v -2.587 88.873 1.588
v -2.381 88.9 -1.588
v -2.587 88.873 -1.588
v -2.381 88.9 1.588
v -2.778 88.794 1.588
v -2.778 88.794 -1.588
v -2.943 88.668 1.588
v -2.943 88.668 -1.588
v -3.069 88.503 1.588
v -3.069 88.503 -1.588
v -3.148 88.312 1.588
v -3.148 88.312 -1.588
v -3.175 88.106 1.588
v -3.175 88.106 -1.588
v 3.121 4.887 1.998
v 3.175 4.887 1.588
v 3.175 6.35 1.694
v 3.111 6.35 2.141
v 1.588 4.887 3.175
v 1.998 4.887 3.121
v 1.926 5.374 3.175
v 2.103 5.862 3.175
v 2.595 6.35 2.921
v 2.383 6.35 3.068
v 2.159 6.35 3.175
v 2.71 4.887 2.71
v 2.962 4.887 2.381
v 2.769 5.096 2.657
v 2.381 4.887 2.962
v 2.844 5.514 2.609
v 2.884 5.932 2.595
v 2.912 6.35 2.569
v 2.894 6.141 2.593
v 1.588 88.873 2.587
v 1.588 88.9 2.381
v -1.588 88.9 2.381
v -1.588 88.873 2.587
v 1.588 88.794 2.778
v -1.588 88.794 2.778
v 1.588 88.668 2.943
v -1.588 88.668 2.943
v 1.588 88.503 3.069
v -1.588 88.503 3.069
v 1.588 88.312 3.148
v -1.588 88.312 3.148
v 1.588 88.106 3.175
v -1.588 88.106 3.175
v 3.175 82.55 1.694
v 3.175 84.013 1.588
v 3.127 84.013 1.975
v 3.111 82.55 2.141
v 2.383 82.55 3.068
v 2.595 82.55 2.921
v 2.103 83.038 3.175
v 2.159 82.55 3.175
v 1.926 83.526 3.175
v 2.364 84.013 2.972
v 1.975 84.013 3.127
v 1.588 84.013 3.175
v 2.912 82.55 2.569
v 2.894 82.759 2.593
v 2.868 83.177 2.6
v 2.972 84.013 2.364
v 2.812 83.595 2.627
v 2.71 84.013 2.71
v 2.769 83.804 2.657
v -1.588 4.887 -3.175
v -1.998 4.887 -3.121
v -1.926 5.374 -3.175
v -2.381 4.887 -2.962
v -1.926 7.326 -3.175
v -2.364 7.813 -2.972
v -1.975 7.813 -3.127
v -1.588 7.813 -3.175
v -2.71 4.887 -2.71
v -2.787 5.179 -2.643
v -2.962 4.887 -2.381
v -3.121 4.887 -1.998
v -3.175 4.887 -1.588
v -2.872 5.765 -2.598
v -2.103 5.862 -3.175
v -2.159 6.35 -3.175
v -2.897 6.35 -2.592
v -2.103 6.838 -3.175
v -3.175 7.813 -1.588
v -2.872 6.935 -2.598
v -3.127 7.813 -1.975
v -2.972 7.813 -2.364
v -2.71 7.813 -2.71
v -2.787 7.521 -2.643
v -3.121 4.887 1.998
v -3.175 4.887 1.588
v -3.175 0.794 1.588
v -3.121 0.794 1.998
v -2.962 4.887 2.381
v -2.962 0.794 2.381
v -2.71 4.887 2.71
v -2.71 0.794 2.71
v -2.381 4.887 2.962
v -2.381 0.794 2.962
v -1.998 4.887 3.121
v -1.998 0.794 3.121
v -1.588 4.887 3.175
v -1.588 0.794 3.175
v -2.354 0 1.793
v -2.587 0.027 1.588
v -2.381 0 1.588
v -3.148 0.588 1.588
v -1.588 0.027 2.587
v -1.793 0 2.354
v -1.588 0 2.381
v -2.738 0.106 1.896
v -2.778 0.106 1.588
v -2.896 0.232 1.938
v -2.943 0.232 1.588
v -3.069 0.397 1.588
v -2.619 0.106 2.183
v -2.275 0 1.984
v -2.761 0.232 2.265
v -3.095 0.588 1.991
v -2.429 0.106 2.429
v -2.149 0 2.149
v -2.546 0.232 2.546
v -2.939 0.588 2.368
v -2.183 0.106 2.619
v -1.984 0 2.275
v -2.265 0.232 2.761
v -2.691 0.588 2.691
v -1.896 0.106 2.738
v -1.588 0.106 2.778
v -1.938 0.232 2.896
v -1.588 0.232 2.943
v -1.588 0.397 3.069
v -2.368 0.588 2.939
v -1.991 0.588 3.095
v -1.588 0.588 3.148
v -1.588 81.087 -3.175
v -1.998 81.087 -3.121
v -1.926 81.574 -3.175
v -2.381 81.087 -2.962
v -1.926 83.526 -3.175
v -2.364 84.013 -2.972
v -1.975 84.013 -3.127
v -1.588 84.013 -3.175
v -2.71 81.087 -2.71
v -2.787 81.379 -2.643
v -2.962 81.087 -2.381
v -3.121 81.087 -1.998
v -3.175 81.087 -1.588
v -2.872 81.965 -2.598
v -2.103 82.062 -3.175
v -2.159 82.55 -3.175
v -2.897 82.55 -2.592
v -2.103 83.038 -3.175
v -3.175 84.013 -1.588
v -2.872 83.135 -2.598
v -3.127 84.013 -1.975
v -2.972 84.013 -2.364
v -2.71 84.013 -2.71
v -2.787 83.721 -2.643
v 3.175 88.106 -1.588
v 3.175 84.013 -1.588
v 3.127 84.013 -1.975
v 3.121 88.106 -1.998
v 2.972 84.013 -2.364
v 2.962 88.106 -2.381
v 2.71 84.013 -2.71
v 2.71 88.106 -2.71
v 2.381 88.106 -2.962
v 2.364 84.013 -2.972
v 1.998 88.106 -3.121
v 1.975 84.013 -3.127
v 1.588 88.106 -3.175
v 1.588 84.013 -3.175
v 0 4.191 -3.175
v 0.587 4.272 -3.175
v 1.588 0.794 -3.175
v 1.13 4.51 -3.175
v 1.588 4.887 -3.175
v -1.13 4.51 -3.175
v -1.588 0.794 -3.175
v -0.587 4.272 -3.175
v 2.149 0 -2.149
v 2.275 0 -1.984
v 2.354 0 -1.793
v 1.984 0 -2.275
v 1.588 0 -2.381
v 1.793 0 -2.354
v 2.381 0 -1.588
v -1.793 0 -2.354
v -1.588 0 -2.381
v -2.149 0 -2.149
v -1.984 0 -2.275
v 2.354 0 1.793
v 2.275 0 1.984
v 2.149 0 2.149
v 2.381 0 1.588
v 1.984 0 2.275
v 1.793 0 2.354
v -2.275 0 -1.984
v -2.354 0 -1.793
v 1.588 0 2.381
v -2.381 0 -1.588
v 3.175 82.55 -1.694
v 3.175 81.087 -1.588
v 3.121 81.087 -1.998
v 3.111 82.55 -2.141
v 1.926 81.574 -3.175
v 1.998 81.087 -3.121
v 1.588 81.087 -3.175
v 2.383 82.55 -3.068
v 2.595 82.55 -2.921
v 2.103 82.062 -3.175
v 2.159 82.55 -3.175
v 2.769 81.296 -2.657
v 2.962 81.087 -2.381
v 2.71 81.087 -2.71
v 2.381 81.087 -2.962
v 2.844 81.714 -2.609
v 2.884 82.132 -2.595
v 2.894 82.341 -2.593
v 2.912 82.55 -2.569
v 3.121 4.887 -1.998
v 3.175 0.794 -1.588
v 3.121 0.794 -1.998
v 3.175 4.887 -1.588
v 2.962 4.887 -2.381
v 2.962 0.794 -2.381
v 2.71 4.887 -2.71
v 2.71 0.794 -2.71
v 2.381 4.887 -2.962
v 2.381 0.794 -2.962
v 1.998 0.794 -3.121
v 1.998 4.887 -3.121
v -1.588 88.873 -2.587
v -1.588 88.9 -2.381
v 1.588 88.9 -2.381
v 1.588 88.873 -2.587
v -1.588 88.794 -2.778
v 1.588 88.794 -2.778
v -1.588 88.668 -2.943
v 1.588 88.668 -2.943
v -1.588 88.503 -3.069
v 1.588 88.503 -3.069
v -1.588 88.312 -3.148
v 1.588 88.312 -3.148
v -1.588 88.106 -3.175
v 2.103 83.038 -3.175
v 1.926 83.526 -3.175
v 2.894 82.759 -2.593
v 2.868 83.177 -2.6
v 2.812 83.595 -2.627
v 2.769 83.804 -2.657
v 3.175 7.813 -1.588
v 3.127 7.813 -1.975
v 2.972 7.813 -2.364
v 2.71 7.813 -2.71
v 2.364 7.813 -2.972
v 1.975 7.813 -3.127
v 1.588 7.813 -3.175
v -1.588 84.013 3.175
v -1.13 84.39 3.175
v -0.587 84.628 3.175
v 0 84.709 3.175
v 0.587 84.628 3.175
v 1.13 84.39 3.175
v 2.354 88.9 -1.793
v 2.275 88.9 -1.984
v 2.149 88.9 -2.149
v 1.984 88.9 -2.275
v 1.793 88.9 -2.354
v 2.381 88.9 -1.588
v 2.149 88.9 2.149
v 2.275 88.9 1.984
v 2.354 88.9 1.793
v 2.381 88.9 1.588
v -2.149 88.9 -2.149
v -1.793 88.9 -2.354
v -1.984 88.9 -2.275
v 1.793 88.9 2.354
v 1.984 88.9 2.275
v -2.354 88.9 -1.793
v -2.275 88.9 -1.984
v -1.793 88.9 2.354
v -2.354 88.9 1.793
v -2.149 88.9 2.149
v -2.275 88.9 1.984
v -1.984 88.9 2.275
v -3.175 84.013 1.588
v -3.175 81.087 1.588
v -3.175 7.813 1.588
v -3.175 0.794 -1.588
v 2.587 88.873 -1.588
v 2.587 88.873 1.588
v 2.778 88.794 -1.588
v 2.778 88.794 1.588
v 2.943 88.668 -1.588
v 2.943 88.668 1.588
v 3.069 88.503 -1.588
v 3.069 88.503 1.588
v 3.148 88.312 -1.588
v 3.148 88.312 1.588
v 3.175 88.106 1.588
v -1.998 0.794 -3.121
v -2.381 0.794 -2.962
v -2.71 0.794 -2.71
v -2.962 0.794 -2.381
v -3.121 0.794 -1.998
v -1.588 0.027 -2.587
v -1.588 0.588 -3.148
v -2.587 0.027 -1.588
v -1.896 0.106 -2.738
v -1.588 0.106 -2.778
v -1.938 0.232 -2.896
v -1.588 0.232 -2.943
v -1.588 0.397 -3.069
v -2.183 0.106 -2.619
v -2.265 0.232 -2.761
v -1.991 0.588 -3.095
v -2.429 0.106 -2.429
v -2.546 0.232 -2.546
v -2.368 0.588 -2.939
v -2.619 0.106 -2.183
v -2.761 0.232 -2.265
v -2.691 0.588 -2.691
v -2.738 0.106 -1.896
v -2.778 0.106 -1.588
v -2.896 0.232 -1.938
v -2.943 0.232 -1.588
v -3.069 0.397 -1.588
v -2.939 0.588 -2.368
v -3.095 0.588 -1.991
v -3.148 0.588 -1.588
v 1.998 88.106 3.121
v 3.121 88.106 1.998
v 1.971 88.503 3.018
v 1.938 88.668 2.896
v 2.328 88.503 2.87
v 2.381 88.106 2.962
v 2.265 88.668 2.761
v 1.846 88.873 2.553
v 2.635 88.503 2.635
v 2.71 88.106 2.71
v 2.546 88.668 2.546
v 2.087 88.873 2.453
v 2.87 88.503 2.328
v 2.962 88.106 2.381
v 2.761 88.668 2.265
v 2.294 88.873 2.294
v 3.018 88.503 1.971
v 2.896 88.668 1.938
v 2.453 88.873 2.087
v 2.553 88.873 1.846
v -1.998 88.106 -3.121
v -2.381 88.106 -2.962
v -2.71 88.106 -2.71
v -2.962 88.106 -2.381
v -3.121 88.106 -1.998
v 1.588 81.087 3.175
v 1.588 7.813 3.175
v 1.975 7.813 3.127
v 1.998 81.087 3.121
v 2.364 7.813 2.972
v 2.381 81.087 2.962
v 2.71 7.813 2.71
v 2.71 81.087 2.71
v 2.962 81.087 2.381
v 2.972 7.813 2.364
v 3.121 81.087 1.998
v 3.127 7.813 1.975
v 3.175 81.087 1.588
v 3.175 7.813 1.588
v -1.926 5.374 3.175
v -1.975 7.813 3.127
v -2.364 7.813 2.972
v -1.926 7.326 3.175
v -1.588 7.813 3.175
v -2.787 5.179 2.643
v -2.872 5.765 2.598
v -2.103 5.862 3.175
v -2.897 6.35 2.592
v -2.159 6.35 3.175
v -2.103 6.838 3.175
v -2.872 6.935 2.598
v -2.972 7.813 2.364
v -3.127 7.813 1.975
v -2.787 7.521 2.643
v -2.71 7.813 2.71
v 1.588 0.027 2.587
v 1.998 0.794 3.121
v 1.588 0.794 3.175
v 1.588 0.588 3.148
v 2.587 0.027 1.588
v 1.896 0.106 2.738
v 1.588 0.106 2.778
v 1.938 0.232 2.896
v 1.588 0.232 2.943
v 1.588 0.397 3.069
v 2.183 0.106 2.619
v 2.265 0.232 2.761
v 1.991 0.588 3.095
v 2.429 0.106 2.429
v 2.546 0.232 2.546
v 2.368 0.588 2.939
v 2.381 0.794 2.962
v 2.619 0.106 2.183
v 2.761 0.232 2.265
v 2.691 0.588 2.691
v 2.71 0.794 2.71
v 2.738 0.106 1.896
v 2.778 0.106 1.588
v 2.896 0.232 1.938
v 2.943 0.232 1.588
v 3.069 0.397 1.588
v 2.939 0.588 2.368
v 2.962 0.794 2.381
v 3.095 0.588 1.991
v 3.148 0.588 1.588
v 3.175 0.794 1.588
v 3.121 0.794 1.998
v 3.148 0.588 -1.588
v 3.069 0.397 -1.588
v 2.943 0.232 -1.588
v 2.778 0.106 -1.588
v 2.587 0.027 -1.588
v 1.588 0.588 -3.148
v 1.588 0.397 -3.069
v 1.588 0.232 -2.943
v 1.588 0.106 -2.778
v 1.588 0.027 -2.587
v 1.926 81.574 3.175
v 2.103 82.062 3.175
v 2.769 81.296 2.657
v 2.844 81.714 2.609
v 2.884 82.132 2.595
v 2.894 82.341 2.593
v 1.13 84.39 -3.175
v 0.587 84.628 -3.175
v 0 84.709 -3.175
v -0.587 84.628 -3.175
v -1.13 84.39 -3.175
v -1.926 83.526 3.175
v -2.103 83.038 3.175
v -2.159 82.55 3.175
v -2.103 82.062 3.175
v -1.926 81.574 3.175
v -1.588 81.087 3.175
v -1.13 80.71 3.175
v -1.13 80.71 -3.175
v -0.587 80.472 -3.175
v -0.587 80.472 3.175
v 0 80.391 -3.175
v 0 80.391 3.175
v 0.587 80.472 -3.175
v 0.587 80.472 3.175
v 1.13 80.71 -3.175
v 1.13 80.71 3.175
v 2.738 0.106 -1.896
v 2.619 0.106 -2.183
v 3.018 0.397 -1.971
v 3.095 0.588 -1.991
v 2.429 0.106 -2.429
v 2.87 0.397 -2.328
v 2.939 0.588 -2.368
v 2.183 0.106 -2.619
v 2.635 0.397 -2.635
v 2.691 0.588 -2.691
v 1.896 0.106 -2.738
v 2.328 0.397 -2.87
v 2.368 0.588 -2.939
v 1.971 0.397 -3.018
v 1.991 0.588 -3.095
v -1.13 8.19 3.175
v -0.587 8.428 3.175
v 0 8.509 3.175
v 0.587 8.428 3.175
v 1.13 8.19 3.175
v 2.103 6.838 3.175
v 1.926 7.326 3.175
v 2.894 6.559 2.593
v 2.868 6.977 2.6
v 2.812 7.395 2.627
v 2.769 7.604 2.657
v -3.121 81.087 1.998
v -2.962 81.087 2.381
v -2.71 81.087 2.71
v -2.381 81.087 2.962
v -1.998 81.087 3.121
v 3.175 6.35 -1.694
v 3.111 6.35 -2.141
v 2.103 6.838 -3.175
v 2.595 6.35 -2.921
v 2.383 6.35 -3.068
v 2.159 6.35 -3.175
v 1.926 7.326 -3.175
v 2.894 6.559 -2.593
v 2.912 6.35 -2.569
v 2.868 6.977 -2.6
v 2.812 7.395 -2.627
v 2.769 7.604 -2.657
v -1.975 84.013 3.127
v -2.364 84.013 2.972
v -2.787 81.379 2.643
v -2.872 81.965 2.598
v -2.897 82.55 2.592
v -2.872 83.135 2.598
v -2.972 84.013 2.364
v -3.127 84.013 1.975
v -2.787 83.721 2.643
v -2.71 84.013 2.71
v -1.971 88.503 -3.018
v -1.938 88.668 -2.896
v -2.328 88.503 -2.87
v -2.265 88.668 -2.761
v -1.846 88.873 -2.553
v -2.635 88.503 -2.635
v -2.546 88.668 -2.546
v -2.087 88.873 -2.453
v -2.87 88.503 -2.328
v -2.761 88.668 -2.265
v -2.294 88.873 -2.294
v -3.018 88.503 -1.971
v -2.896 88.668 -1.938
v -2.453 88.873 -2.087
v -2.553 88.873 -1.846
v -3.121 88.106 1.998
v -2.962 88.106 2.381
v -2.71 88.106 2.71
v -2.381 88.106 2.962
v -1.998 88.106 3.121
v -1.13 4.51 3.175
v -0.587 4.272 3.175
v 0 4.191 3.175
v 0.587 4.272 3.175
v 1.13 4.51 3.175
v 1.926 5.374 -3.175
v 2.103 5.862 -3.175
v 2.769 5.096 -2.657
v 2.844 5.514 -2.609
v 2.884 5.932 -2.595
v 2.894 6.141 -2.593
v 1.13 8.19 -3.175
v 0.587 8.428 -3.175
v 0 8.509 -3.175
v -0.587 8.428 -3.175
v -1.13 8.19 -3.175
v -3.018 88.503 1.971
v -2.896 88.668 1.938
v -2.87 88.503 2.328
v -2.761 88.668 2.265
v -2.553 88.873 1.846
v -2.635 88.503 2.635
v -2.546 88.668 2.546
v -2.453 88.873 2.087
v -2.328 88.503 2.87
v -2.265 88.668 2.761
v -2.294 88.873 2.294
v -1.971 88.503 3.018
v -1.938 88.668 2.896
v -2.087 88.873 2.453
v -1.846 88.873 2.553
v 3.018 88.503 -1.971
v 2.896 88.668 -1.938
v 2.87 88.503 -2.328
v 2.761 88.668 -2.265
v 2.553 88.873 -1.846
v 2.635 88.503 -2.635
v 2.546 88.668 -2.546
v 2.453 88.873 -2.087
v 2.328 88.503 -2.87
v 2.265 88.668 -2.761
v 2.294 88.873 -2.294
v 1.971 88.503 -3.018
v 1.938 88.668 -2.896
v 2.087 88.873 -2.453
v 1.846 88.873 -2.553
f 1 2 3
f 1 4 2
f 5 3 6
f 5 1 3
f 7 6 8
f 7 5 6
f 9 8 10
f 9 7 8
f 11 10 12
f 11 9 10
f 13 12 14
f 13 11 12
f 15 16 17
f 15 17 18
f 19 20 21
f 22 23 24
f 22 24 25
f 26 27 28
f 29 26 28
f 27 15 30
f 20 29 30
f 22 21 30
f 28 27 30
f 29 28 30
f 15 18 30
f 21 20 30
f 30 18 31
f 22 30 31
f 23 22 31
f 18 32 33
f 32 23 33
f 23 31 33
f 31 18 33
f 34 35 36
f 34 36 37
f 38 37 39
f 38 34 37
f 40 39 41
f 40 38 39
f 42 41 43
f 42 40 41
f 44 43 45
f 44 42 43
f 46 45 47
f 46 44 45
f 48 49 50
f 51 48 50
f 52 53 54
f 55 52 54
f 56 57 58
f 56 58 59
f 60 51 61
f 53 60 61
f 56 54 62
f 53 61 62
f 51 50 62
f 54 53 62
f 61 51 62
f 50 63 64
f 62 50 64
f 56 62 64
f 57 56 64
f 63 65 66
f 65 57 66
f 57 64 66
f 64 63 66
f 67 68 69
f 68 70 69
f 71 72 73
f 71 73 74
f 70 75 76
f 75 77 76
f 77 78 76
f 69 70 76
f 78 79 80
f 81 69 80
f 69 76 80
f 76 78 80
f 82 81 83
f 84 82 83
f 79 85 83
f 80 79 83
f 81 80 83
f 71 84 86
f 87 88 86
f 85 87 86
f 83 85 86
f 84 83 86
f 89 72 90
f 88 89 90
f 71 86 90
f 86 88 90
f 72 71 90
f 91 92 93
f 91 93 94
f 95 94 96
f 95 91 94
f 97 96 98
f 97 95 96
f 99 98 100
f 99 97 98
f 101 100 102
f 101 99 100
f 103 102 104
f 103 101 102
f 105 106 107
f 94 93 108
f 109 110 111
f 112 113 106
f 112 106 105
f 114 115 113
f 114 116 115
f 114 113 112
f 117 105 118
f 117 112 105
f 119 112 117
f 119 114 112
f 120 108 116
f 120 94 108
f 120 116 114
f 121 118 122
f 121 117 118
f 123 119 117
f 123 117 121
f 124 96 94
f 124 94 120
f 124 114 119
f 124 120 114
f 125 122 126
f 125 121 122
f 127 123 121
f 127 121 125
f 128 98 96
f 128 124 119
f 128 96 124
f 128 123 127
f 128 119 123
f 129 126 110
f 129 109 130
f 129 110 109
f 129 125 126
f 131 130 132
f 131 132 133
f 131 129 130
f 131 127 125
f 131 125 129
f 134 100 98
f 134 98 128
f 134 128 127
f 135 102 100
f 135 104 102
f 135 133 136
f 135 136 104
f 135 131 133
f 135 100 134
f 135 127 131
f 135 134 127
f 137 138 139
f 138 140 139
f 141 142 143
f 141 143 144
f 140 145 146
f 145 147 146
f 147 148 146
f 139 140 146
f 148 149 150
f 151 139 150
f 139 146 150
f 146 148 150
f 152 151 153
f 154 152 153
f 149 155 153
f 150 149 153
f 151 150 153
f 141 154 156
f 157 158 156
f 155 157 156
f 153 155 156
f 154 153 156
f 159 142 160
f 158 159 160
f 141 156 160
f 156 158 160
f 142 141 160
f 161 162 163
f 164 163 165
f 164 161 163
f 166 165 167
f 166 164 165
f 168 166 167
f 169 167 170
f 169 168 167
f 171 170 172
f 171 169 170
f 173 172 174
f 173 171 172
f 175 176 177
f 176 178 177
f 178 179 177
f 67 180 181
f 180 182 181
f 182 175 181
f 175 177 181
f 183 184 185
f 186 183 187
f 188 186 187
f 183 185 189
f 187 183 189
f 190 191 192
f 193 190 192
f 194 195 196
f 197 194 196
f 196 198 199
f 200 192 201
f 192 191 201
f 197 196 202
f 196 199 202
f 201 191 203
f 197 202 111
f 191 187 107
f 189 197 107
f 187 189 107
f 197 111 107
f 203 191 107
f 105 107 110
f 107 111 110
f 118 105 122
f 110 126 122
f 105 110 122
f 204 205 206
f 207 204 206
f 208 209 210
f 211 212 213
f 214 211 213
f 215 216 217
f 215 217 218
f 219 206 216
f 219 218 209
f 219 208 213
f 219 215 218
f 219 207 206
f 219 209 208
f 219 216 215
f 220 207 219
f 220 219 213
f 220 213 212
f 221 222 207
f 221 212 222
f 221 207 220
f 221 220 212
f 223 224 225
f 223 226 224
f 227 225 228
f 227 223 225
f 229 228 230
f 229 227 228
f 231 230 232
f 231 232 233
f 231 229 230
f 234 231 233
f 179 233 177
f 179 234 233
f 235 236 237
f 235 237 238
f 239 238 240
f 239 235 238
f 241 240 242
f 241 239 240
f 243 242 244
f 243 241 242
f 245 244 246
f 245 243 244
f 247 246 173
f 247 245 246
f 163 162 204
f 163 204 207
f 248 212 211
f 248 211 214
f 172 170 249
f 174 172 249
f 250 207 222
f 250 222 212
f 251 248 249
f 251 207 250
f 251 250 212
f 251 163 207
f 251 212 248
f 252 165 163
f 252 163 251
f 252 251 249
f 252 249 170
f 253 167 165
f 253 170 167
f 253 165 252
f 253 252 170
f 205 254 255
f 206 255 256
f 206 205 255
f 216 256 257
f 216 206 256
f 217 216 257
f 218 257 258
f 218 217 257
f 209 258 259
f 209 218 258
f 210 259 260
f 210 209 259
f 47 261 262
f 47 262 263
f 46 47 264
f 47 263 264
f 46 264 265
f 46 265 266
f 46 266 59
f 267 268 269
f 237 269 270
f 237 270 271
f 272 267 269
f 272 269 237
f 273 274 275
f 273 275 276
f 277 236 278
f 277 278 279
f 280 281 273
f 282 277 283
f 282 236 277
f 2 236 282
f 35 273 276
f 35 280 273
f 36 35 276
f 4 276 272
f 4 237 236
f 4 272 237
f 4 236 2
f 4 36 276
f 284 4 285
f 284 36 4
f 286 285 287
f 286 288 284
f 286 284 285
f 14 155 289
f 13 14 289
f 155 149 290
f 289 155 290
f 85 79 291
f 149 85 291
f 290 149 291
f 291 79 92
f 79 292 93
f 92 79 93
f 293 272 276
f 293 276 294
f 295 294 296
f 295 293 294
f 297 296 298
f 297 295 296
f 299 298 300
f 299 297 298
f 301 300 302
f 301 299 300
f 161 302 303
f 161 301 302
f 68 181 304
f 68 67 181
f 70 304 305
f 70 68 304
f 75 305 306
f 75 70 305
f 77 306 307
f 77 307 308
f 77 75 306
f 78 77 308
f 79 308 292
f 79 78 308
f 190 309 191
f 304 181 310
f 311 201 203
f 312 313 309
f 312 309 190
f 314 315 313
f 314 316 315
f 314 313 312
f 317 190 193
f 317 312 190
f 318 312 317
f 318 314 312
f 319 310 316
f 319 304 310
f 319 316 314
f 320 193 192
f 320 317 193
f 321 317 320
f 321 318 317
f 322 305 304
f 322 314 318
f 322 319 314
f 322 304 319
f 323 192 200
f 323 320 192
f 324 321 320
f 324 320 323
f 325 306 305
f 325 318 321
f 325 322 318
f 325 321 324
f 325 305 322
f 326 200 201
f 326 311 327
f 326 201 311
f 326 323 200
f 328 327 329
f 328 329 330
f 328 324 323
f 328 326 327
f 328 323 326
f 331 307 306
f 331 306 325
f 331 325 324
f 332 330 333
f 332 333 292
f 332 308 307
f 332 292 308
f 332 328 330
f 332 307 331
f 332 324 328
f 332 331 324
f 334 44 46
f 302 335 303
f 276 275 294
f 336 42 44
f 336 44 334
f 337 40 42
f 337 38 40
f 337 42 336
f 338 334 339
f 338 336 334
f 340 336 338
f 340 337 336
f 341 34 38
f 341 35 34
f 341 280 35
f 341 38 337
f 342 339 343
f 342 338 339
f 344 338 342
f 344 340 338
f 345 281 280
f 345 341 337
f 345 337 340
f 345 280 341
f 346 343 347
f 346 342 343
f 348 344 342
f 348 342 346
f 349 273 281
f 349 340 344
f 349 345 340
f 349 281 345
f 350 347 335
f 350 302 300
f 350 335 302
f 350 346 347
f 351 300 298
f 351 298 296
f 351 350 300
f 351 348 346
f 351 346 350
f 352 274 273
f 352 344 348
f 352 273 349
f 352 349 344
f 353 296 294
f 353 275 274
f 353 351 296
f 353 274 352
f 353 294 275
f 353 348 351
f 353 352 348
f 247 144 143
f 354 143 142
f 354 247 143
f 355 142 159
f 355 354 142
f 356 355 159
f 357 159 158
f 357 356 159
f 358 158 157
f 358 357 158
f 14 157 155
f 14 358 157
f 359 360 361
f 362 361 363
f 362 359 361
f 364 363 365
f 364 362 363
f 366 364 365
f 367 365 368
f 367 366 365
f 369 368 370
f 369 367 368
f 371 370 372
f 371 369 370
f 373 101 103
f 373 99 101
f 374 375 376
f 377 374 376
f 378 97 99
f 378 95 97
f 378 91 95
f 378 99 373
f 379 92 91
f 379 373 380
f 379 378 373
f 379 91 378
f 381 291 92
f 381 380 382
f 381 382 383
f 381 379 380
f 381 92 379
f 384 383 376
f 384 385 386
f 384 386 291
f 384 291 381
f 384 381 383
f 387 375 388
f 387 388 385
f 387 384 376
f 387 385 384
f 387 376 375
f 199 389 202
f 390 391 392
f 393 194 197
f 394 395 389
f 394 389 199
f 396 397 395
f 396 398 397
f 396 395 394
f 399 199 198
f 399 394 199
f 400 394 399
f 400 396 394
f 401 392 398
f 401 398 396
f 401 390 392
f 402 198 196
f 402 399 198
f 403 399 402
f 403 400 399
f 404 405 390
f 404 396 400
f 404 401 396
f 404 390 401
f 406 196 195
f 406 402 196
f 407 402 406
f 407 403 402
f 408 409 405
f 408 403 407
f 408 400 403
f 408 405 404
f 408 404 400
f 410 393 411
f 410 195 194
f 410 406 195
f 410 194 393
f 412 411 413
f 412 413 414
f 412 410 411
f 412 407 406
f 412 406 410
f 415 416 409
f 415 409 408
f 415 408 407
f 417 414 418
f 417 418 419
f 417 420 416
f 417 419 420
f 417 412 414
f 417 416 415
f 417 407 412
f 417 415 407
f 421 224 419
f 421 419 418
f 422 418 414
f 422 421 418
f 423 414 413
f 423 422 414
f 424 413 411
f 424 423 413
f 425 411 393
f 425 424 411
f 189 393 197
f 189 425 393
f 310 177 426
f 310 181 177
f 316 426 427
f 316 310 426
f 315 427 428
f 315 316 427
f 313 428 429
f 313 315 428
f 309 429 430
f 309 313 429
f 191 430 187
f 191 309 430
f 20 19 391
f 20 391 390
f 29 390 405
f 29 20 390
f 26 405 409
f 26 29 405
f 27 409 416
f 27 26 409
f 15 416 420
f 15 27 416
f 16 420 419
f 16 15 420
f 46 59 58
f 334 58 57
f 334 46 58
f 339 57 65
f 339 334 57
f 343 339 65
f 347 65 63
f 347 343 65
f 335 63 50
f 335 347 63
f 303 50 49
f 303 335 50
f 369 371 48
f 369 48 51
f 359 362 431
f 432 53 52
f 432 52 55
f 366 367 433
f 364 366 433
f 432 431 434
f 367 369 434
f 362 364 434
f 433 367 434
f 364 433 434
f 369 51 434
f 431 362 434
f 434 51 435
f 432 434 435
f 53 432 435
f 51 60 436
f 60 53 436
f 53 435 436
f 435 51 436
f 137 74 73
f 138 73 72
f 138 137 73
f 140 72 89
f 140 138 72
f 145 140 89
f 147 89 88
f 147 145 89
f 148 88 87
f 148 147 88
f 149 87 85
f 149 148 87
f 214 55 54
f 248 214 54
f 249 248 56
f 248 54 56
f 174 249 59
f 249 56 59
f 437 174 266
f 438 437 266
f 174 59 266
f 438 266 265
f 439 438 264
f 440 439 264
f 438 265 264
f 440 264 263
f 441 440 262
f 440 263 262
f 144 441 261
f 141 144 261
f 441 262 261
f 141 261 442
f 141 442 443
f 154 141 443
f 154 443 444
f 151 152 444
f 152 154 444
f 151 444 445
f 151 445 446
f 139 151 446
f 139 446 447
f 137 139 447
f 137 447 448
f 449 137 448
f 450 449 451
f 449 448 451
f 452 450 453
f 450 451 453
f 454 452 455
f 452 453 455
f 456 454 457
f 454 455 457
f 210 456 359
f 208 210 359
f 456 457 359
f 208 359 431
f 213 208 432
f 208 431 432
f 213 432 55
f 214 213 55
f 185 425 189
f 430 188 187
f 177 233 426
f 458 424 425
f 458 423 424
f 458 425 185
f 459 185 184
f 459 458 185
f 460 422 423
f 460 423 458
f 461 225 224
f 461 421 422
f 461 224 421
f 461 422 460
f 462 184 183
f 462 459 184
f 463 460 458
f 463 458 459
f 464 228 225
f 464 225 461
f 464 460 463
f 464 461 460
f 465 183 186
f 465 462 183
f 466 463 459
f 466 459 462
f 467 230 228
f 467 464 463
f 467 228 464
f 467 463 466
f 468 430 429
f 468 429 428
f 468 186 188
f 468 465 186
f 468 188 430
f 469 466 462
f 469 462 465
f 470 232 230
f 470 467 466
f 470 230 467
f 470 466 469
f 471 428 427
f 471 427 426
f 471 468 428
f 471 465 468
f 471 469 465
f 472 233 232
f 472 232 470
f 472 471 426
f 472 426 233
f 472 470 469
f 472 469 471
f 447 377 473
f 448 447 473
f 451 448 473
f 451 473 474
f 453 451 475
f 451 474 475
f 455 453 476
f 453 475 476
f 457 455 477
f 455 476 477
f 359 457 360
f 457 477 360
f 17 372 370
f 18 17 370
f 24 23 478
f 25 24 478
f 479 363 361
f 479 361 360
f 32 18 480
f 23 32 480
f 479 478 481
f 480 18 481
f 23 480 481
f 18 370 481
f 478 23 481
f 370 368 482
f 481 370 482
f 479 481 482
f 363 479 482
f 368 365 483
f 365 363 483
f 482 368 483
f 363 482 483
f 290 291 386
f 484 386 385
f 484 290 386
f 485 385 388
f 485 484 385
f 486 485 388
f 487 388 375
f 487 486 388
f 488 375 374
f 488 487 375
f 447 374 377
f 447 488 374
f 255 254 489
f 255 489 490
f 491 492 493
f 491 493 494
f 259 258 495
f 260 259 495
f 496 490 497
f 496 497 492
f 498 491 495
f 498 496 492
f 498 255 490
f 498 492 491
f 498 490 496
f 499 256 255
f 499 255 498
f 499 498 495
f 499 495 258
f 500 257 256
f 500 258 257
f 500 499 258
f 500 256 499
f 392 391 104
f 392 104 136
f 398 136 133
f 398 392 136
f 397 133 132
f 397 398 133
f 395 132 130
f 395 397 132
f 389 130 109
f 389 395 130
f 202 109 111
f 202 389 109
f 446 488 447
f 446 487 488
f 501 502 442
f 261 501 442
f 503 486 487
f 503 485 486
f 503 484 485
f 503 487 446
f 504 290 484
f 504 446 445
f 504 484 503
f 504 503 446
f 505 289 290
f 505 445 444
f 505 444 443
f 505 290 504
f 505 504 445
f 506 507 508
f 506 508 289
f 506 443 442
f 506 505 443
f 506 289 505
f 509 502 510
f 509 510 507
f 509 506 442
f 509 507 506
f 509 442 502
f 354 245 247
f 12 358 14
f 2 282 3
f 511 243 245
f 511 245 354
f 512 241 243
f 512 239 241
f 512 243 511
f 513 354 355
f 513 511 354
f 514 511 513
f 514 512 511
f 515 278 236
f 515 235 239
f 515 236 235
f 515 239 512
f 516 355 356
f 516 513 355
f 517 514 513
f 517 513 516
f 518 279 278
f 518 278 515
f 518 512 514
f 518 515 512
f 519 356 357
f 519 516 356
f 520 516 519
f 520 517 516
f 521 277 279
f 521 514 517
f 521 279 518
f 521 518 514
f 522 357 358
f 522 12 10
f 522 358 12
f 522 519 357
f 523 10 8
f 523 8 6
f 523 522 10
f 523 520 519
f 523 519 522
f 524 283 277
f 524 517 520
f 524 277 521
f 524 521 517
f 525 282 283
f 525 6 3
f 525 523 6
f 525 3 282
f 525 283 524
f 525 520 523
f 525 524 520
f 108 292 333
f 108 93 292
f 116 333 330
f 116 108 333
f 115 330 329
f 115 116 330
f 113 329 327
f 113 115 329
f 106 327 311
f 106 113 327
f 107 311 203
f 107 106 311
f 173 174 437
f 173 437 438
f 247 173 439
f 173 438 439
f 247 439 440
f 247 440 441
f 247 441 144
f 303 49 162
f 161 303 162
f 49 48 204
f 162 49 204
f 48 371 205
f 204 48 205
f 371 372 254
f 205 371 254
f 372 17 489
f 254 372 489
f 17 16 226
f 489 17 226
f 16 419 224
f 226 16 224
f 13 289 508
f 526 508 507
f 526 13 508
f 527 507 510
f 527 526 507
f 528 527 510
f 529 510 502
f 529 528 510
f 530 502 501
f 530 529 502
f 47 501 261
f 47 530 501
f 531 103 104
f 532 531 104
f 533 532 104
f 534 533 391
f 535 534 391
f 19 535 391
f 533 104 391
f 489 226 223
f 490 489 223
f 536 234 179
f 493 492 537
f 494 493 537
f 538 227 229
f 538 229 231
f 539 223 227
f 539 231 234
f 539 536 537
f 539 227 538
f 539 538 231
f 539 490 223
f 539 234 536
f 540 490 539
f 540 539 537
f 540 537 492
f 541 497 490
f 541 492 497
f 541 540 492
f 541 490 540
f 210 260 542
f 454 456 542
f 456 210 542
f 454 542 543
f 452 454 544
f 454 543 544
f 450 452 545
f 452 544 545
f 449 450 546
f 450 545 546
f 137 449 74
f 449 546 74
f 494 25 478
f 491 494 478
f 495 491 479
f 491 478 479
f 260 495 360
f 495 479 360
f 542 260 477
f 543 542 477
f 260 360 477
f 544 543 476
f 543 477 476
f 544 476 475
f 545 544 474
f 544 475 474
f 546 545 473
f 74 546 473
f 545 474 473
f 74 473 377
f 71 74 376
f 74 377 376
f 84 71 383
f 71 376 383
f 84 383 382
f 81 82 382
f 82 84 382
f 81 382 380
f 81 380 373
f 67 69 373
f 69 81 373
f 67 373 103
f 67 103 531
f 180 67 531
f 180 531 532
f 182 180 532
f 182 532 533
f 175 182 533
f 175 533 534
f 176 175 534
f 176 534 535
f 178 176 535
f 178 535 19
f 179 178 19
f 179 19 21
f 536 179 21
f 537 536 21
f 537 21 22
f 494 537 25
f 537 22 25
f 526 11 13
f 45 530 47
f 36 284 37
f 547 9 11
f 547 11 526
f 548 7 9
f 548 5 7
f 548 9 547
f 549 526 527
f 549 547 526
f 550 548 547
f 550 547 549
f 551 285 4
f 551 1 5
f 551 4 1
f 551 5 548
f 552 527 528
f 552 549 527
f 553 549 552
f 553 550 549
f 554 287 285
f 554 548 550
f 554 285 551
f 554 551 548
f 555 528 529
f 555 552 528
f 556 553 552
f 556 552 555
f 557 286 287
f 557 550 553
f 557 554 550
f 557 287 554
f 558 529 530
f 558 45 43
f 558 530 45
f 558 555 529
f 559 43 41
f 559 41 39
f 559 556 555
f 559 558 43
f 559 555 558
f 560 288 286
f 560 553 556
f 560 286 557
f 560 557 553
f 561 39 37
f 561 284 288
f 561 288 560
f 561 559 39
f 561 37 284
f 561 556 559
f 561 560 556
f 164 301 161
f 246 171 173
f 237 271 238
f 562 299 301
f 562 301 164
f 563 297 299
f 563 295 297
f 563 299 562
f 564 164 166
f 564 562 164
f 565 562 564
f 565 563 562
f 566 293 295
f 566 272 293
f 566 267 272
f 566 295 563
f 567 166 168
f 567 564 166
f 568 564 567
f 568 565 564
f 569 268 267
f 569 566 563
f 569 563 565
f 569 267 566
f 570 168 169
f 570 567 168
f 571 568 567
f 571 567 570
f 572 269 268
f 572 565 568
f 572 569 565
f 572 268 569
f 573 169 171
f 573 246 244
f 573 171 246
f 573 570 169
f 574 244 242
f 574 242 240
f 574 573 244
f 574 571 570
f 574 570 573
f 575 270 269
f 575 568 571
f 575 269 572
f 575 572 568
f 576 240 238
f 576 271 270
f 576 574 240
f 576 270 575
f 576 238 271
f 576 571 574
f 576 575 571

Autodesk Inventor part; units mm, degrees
ref_plane "YZ Plane" through (0, 0, 0) normal (1, 0, 0) x (0, 1, 0)
ref_plane "XZ Plane" through (0, 0, 0) normal (0, 1, 0) x (-1, 0, 0)
ref_plane "XY Plane" through (0, 0, 0) normal (0, 0, 1) x (1, 0, 0)
sketch "Sketch1" plane through (0, 0, 0) normal (0, 1, 0) x (-1, 0, 0)
  line L0 (-3.175, -3.175) -> (3.175, -3.175)
  line L1 (3.175, -3.175) -> (3.175, 3.175)
  line L2 (3.175, 3.175) -> (-3.175, 3.175)
  line L3 (-3.175, 3.175) -> (-3.175, -3.175)
  line L4 (-3.175, -3.175) -> (3.175, 3.175) construction
  line L5 (3.175, -3.175) -> (-3.175, 3.175) construction
  point P0 (0, 0)
  dimension "d0" = 6.35
  dimension "d1" = 6.35
extrude "Extrusion1" add sketch "Sketch1" along normal blind 88.9
sketch "Sketch2" plane through (-3.175, 0, 3.175) normal (0, 0, 1) x (1, 0, 0)
  circle A0 centre (3.175, 6.35) radius 2.159
  line L0 (0, 0) -> (6.35, 0) projected
  circle A1 centre (3.175, 82.55) radius 2.159
  line L1 (0, 88.9) -> (6.35, 88.9) projected
  point P0 (3.175, 0)
  dimension "d4" = 4.318
  dimension "d5" = 6.35
  dimension "d6" = 4.318
  dimension "d7" = 6.35
extrude "Extrusion2" cut sketch "Sketch2" against normal blind 88.9
fillet "Fillet1" radius 1.5875 4 edges at (3.175, 44.45, -3.175) (-3.175, 44.45, -3.175) (3.175, 44.45, 3.175) (-3.175, 44.45, 3.175)
fillet "Fillet2" radius 0.7937 16 edges at (2.71, 88.9, -2.71) (0, 88.9, -3.175) (-2.71, 88.9, -2.71) (-3.175, 88.9, 0) (-2.71, 88.9, 2.71) (0, 88.9, 3.175) (2.71, 88.9, 2.71) (3.175, 88.9, 0) (0, 0, -3.175) (-2.71, 0, -2.71) (-3.175, 0, 0) (-2.71, 0, 2.71) (0, 0, 3.175) (2.71, 0, 2.71) (3.175, 0, 0) (2.71, 0, -2.71)
properties part number "45 stop" material "Stainless Steel"
